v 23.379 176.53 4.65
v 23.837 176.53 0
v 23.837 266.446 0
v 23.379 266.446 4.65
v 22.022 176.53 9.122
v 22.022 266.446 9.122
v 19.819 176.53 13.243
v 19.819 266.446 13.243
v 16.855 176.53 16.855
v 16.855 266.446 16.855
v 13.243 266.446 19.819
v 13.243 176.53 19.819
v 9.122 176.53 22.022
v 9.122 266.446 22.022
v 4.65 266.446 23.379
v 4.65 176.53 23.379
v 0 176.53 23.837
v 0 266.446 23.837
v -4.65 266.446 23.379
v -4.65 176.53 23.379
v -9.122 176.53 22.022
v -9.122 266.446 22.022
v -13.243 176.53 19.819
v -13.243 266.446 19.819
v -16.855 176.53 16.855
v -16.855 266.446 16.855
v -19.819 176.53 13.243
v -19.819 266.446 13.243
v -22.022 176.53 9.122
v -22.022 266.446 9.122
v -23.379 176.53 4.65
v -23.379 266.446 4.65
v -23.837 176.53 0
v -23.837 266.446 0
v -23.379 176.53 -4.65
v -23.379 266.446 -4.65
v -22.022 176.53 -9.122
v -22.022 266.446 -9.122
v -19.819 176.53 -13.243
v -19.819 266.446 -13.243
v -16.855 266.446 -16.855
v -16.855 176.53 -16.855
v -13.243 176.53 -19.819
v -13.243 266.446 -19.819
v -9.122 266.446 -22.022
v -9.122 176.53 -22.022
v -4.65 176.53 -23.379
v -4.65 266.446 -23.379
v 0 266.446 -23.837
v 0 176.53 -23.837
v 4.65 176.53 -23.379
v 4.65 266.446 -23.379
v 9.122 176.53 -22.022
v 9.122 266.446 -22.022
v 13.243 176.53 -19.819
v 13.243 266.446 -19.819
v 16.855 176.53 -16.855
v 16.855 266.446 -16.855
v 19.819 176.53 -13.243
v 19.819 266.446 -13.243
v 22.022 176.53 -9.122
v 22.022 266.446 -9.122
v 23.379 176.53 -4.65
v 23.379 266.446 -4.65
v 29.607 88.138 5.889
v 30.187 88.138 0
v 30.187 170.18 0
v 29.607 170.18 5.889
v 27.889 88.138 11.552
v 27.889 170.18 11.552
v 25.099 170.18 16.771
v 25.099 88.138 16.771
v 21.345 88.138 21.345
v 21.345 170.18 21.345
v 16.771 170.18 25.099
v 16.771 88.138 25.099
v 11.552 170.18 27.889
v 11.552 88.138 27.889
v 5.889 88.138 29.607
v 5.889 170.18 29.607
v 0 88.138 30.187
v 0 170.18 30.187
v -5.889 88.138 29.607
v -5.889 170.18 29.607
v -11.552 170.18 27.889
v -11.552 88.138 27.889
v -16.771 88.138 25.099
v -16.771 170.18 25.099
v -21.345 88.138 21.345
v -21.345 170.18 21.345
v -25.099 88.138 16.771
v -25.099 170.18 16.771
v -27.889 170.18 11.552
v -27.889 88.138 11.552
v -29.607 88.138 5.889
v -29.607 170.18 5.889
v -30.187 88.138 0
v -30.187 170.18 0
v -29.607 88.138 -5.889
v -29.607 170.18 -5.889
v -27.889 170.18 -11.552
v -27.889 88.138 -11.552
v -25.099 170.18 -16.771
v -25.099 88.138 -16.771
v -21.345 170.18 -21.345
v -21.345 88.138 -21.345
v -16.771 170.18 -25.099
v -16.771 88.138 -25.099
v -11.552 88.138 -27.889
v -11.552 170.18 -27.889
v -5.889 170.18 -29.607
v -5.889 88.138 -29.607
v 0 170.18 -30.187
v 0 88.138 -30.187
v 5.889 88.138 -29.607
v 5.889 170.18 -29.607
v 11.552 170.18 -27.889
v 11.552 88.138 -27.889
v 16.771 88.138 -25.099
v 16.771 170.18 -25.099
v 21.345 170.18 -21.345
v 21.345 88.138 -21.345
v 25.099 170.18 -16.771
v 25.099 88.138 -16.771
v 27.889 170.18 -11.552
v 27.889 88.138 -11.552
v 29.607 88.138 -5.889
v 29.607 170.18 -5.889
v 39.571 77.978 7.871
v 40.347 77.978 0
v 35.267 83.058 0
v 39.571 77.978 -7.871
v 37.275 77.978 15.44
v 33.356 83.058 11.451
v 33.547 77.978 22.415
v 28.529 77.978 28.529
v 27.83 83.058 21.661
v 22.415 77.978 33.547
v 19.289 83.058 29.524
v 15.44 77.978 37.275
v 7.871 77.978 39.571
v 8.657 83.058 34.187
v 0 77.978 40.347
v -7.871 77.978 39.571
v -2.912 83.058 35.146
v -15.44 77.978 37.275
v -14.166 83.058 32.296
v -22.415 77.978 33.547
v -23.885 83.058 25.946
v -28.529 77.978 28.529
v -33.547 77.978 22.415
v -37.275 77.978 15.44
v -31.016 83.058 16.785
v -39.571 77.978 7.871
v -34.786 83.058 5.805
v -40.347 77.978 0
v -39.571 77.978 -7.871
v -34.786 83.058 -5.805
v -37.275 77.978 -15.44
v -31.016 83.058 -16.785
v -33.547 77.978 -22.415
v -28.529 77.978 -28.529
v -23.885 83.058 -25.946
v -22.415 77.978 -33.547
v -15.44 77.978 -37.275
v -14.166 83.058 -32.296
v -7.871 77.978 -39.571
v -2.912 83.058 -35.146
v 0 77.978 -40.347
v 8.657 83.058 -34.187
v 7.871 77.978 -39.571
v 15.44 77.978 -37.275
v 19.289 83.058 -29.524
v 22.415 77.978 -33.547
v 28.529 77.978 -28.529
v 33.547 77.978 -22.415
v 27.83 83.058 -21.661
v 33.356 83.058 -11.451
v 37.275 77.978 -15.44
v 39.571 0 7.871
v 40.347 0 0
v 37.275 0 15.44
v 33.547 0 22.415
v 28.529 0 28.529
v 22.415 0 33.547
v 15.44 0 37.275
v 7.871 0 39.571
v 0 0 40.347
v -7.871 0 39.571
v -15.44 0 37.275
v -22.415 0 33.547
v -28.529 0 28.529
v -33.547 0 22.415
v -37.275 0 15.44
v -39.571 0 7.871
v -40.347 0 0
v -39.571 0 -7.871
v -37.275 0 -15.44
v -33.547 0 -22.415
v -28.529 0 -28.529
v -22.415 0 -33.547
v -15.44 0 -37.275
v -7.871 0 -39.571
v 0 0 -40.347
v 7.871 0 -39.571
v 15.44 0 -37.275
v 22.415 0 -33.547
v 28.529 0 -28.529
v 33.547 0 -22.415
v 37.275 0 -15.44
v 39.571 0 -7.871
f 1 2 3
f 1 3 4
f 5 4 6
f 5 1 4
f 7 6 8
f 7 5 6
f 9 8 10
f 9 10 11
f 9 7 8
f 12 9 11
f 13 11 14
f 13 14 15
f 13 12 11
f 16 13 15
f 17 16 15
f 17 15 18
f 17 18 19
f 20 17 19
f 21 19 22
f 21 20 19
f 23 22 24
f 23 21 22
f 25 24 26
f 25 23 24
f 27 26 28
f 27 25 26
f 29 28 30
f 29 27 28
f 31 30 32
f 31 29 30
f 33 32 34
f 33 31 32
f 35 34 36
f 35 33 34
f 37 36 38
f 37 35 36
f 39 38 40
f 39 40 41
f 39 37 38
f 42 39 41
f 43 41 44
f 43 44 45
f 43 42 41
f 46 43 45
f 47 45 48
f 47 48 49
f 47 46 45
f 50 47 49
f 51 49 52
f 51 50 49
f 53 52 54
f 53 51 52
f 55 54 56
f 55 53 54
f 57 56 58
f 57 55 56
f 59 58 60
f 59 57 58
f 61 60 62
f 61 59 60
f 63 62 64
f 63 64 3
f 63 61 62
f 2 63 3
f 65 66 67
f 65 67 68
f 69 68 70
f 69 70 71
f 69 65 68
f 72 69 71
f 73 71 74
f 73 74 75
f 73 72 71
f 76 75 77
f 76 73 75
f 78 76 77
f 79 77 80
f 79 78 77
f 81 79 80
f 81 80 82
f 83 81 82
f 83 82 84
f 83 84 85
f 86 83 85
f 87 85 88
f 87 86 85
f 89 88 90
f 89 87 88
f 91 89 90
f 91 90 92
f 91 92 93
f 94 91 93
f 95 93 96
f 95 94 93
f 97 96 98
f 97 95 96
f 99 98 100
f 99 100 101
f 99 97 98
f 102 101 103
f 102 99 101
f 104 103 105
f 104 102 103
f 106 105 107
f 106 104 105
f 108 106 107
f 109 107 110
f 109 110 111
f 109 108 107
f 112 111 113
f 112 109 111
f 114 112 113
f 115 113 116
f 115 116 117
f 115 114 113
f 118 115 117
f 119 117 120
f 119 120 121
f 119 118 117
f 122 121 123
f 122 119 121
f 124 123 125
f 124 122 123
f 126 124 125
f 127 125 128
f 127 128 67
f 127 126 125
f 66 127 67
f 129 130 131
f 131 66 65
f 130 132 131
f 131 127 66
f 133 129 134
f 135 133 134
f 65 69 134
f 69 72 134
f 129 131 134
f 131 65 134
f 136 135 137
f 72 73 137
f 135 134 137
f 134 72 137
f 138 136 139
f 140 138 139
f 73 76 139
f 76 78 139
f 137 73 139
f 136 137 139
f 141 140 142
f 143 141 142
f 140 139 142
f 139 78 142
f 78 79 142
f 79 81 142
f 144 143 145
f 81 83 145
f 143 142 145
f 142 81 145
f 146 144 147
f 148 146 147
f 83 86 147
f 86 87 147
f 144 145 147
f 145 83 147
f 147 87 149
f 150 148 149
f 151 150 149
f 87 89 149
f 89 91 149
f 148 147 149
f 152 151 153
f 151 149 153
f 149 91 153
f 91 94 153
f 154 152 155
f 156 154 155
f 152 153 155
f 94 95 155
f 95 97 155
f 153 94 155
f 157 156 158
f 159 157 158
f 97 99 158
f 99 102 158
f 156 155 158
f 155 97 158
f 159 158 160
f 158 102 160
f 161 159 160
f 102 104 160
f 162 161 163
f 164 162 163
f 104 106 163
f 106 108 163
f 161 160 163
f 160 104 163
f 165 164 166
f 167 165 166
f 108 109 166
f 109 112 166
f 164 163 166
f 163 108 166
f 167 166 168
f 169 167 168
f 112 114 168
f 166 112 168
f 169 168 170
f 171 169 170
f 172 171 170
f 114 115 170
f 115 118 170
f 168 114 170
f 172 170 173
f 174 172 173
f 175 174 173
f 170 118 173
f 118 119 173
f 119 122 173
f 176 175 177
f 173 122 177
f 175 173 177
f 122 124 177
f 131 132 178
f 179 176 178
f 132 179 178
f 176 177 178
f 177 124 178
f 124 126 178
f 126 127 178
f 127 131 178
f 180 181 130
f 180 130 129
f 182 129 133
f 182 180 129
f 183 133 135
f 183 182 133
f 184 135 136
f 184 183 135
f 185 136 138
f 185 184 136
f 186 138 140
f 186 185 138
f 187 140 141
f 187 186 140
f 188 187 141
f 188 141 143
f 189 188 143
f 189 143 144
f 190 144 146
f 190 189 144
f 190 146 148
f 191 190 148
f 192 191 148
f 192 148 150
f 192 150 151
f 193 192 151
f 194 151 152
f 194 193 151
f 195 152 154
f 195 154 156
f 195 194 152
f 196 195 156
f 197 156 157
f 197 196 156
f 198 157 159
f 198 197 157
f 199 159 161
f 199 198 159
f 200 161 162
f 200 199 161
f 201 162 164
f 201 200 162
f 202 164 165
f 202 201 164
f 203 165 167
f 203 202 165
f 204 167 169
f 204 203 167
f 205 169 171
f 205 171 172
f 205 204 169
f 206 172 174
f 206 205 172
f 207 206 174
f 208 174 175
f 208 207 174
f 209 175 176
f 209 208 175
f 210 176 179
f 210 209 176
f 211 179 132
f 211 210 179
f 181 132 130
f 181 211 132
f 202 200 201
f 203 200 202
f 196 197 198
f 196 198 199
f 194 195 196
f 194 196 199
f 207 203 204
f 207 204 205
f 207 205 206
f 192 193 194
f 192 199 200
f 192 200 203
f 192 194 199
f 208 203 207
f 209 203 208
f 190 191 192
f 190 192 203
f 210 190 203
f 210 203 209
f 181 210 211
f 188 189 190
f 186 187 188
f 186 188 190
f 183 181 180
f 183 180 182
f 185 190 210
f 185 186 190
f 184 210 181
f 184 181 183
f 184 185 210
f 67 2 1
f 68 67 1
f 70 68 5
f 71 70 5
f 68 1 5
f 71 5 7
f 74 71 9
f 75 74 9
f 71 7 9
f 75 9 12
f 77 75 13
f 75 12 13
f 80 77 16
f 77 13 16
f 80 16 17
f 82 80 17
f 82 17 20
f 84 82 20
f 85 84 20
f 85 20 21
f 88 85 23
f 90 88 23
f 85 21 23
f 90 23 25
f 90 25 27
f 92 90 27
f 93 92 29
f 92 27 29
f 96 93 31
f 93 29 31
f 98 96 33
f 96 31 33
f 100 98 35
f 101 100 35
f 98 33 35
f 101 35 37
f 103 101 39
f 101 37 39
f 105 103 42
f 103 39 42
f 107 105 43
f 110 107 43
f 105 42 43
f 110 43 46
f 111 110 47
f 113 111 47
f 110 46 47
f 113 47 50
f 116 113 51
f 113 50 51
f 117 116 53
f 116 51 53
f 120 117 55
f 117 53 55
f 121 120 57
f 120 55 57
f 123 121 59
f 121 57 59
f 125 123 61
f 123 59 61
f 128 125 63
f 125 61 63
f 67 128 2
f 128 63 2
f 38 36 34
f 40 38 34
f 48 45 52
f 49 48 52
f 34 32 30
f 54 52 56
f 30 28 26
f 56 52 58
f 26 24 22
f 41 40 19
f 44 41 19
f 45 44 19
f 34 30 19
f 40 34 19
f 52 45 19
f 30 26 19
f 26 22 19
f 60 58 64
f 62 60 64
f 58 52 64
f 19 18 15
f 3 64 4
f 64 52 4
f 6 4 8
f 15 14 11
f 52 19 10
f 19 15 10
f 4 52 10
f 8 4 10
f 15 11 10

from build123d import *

# Parameters (mm, degrees)
F0_R     = 40.346618638
F1_DEPTH = 88.138
F2_SIZE  = 10.16
F3_DEPTH = 88.392
F4_SIZE  = 6.35
F5_DEPTH = 89.916


with BuildPart() as f1:
    # F0 (on Front) → F1 (new body)
    with BuildSketch(Plane.XZ):
        Circle(F0_R)
    extrude(amount=-F1_DEPTH)

    # F2
    f2_edges = [f1.edges().sort_by_distance(p)[0] for p in [
        (-40.346619, 88.138, 0),
    ]]
    chamfer(f2_edges, length=F2_SIZE)

    # F3 (add): a face of the model
    f3_faces = [f1.faces().sort_by_distance(p)[0] for p in [
        (0, 88.138, 0),
    ]]
    extrude(f3_faces, amount=F3_DEPTH)

    # F4
    f4_edges = [f1.edges().sort_by_distance(p)[0] for p in [
        (-30.186619, 176.53, 0),
    ]]
    chamfer(f4_edges, length=F4_SIZE)

    # F5 (add): a face of the model
    f5_faces = [f1.faces().sort_by_distance(p)[0] for p in [
        (0, 176.53, 0),
    ]]
    extrude(f5_faces, amount=F5_DEPTH)


solid = f1.part
